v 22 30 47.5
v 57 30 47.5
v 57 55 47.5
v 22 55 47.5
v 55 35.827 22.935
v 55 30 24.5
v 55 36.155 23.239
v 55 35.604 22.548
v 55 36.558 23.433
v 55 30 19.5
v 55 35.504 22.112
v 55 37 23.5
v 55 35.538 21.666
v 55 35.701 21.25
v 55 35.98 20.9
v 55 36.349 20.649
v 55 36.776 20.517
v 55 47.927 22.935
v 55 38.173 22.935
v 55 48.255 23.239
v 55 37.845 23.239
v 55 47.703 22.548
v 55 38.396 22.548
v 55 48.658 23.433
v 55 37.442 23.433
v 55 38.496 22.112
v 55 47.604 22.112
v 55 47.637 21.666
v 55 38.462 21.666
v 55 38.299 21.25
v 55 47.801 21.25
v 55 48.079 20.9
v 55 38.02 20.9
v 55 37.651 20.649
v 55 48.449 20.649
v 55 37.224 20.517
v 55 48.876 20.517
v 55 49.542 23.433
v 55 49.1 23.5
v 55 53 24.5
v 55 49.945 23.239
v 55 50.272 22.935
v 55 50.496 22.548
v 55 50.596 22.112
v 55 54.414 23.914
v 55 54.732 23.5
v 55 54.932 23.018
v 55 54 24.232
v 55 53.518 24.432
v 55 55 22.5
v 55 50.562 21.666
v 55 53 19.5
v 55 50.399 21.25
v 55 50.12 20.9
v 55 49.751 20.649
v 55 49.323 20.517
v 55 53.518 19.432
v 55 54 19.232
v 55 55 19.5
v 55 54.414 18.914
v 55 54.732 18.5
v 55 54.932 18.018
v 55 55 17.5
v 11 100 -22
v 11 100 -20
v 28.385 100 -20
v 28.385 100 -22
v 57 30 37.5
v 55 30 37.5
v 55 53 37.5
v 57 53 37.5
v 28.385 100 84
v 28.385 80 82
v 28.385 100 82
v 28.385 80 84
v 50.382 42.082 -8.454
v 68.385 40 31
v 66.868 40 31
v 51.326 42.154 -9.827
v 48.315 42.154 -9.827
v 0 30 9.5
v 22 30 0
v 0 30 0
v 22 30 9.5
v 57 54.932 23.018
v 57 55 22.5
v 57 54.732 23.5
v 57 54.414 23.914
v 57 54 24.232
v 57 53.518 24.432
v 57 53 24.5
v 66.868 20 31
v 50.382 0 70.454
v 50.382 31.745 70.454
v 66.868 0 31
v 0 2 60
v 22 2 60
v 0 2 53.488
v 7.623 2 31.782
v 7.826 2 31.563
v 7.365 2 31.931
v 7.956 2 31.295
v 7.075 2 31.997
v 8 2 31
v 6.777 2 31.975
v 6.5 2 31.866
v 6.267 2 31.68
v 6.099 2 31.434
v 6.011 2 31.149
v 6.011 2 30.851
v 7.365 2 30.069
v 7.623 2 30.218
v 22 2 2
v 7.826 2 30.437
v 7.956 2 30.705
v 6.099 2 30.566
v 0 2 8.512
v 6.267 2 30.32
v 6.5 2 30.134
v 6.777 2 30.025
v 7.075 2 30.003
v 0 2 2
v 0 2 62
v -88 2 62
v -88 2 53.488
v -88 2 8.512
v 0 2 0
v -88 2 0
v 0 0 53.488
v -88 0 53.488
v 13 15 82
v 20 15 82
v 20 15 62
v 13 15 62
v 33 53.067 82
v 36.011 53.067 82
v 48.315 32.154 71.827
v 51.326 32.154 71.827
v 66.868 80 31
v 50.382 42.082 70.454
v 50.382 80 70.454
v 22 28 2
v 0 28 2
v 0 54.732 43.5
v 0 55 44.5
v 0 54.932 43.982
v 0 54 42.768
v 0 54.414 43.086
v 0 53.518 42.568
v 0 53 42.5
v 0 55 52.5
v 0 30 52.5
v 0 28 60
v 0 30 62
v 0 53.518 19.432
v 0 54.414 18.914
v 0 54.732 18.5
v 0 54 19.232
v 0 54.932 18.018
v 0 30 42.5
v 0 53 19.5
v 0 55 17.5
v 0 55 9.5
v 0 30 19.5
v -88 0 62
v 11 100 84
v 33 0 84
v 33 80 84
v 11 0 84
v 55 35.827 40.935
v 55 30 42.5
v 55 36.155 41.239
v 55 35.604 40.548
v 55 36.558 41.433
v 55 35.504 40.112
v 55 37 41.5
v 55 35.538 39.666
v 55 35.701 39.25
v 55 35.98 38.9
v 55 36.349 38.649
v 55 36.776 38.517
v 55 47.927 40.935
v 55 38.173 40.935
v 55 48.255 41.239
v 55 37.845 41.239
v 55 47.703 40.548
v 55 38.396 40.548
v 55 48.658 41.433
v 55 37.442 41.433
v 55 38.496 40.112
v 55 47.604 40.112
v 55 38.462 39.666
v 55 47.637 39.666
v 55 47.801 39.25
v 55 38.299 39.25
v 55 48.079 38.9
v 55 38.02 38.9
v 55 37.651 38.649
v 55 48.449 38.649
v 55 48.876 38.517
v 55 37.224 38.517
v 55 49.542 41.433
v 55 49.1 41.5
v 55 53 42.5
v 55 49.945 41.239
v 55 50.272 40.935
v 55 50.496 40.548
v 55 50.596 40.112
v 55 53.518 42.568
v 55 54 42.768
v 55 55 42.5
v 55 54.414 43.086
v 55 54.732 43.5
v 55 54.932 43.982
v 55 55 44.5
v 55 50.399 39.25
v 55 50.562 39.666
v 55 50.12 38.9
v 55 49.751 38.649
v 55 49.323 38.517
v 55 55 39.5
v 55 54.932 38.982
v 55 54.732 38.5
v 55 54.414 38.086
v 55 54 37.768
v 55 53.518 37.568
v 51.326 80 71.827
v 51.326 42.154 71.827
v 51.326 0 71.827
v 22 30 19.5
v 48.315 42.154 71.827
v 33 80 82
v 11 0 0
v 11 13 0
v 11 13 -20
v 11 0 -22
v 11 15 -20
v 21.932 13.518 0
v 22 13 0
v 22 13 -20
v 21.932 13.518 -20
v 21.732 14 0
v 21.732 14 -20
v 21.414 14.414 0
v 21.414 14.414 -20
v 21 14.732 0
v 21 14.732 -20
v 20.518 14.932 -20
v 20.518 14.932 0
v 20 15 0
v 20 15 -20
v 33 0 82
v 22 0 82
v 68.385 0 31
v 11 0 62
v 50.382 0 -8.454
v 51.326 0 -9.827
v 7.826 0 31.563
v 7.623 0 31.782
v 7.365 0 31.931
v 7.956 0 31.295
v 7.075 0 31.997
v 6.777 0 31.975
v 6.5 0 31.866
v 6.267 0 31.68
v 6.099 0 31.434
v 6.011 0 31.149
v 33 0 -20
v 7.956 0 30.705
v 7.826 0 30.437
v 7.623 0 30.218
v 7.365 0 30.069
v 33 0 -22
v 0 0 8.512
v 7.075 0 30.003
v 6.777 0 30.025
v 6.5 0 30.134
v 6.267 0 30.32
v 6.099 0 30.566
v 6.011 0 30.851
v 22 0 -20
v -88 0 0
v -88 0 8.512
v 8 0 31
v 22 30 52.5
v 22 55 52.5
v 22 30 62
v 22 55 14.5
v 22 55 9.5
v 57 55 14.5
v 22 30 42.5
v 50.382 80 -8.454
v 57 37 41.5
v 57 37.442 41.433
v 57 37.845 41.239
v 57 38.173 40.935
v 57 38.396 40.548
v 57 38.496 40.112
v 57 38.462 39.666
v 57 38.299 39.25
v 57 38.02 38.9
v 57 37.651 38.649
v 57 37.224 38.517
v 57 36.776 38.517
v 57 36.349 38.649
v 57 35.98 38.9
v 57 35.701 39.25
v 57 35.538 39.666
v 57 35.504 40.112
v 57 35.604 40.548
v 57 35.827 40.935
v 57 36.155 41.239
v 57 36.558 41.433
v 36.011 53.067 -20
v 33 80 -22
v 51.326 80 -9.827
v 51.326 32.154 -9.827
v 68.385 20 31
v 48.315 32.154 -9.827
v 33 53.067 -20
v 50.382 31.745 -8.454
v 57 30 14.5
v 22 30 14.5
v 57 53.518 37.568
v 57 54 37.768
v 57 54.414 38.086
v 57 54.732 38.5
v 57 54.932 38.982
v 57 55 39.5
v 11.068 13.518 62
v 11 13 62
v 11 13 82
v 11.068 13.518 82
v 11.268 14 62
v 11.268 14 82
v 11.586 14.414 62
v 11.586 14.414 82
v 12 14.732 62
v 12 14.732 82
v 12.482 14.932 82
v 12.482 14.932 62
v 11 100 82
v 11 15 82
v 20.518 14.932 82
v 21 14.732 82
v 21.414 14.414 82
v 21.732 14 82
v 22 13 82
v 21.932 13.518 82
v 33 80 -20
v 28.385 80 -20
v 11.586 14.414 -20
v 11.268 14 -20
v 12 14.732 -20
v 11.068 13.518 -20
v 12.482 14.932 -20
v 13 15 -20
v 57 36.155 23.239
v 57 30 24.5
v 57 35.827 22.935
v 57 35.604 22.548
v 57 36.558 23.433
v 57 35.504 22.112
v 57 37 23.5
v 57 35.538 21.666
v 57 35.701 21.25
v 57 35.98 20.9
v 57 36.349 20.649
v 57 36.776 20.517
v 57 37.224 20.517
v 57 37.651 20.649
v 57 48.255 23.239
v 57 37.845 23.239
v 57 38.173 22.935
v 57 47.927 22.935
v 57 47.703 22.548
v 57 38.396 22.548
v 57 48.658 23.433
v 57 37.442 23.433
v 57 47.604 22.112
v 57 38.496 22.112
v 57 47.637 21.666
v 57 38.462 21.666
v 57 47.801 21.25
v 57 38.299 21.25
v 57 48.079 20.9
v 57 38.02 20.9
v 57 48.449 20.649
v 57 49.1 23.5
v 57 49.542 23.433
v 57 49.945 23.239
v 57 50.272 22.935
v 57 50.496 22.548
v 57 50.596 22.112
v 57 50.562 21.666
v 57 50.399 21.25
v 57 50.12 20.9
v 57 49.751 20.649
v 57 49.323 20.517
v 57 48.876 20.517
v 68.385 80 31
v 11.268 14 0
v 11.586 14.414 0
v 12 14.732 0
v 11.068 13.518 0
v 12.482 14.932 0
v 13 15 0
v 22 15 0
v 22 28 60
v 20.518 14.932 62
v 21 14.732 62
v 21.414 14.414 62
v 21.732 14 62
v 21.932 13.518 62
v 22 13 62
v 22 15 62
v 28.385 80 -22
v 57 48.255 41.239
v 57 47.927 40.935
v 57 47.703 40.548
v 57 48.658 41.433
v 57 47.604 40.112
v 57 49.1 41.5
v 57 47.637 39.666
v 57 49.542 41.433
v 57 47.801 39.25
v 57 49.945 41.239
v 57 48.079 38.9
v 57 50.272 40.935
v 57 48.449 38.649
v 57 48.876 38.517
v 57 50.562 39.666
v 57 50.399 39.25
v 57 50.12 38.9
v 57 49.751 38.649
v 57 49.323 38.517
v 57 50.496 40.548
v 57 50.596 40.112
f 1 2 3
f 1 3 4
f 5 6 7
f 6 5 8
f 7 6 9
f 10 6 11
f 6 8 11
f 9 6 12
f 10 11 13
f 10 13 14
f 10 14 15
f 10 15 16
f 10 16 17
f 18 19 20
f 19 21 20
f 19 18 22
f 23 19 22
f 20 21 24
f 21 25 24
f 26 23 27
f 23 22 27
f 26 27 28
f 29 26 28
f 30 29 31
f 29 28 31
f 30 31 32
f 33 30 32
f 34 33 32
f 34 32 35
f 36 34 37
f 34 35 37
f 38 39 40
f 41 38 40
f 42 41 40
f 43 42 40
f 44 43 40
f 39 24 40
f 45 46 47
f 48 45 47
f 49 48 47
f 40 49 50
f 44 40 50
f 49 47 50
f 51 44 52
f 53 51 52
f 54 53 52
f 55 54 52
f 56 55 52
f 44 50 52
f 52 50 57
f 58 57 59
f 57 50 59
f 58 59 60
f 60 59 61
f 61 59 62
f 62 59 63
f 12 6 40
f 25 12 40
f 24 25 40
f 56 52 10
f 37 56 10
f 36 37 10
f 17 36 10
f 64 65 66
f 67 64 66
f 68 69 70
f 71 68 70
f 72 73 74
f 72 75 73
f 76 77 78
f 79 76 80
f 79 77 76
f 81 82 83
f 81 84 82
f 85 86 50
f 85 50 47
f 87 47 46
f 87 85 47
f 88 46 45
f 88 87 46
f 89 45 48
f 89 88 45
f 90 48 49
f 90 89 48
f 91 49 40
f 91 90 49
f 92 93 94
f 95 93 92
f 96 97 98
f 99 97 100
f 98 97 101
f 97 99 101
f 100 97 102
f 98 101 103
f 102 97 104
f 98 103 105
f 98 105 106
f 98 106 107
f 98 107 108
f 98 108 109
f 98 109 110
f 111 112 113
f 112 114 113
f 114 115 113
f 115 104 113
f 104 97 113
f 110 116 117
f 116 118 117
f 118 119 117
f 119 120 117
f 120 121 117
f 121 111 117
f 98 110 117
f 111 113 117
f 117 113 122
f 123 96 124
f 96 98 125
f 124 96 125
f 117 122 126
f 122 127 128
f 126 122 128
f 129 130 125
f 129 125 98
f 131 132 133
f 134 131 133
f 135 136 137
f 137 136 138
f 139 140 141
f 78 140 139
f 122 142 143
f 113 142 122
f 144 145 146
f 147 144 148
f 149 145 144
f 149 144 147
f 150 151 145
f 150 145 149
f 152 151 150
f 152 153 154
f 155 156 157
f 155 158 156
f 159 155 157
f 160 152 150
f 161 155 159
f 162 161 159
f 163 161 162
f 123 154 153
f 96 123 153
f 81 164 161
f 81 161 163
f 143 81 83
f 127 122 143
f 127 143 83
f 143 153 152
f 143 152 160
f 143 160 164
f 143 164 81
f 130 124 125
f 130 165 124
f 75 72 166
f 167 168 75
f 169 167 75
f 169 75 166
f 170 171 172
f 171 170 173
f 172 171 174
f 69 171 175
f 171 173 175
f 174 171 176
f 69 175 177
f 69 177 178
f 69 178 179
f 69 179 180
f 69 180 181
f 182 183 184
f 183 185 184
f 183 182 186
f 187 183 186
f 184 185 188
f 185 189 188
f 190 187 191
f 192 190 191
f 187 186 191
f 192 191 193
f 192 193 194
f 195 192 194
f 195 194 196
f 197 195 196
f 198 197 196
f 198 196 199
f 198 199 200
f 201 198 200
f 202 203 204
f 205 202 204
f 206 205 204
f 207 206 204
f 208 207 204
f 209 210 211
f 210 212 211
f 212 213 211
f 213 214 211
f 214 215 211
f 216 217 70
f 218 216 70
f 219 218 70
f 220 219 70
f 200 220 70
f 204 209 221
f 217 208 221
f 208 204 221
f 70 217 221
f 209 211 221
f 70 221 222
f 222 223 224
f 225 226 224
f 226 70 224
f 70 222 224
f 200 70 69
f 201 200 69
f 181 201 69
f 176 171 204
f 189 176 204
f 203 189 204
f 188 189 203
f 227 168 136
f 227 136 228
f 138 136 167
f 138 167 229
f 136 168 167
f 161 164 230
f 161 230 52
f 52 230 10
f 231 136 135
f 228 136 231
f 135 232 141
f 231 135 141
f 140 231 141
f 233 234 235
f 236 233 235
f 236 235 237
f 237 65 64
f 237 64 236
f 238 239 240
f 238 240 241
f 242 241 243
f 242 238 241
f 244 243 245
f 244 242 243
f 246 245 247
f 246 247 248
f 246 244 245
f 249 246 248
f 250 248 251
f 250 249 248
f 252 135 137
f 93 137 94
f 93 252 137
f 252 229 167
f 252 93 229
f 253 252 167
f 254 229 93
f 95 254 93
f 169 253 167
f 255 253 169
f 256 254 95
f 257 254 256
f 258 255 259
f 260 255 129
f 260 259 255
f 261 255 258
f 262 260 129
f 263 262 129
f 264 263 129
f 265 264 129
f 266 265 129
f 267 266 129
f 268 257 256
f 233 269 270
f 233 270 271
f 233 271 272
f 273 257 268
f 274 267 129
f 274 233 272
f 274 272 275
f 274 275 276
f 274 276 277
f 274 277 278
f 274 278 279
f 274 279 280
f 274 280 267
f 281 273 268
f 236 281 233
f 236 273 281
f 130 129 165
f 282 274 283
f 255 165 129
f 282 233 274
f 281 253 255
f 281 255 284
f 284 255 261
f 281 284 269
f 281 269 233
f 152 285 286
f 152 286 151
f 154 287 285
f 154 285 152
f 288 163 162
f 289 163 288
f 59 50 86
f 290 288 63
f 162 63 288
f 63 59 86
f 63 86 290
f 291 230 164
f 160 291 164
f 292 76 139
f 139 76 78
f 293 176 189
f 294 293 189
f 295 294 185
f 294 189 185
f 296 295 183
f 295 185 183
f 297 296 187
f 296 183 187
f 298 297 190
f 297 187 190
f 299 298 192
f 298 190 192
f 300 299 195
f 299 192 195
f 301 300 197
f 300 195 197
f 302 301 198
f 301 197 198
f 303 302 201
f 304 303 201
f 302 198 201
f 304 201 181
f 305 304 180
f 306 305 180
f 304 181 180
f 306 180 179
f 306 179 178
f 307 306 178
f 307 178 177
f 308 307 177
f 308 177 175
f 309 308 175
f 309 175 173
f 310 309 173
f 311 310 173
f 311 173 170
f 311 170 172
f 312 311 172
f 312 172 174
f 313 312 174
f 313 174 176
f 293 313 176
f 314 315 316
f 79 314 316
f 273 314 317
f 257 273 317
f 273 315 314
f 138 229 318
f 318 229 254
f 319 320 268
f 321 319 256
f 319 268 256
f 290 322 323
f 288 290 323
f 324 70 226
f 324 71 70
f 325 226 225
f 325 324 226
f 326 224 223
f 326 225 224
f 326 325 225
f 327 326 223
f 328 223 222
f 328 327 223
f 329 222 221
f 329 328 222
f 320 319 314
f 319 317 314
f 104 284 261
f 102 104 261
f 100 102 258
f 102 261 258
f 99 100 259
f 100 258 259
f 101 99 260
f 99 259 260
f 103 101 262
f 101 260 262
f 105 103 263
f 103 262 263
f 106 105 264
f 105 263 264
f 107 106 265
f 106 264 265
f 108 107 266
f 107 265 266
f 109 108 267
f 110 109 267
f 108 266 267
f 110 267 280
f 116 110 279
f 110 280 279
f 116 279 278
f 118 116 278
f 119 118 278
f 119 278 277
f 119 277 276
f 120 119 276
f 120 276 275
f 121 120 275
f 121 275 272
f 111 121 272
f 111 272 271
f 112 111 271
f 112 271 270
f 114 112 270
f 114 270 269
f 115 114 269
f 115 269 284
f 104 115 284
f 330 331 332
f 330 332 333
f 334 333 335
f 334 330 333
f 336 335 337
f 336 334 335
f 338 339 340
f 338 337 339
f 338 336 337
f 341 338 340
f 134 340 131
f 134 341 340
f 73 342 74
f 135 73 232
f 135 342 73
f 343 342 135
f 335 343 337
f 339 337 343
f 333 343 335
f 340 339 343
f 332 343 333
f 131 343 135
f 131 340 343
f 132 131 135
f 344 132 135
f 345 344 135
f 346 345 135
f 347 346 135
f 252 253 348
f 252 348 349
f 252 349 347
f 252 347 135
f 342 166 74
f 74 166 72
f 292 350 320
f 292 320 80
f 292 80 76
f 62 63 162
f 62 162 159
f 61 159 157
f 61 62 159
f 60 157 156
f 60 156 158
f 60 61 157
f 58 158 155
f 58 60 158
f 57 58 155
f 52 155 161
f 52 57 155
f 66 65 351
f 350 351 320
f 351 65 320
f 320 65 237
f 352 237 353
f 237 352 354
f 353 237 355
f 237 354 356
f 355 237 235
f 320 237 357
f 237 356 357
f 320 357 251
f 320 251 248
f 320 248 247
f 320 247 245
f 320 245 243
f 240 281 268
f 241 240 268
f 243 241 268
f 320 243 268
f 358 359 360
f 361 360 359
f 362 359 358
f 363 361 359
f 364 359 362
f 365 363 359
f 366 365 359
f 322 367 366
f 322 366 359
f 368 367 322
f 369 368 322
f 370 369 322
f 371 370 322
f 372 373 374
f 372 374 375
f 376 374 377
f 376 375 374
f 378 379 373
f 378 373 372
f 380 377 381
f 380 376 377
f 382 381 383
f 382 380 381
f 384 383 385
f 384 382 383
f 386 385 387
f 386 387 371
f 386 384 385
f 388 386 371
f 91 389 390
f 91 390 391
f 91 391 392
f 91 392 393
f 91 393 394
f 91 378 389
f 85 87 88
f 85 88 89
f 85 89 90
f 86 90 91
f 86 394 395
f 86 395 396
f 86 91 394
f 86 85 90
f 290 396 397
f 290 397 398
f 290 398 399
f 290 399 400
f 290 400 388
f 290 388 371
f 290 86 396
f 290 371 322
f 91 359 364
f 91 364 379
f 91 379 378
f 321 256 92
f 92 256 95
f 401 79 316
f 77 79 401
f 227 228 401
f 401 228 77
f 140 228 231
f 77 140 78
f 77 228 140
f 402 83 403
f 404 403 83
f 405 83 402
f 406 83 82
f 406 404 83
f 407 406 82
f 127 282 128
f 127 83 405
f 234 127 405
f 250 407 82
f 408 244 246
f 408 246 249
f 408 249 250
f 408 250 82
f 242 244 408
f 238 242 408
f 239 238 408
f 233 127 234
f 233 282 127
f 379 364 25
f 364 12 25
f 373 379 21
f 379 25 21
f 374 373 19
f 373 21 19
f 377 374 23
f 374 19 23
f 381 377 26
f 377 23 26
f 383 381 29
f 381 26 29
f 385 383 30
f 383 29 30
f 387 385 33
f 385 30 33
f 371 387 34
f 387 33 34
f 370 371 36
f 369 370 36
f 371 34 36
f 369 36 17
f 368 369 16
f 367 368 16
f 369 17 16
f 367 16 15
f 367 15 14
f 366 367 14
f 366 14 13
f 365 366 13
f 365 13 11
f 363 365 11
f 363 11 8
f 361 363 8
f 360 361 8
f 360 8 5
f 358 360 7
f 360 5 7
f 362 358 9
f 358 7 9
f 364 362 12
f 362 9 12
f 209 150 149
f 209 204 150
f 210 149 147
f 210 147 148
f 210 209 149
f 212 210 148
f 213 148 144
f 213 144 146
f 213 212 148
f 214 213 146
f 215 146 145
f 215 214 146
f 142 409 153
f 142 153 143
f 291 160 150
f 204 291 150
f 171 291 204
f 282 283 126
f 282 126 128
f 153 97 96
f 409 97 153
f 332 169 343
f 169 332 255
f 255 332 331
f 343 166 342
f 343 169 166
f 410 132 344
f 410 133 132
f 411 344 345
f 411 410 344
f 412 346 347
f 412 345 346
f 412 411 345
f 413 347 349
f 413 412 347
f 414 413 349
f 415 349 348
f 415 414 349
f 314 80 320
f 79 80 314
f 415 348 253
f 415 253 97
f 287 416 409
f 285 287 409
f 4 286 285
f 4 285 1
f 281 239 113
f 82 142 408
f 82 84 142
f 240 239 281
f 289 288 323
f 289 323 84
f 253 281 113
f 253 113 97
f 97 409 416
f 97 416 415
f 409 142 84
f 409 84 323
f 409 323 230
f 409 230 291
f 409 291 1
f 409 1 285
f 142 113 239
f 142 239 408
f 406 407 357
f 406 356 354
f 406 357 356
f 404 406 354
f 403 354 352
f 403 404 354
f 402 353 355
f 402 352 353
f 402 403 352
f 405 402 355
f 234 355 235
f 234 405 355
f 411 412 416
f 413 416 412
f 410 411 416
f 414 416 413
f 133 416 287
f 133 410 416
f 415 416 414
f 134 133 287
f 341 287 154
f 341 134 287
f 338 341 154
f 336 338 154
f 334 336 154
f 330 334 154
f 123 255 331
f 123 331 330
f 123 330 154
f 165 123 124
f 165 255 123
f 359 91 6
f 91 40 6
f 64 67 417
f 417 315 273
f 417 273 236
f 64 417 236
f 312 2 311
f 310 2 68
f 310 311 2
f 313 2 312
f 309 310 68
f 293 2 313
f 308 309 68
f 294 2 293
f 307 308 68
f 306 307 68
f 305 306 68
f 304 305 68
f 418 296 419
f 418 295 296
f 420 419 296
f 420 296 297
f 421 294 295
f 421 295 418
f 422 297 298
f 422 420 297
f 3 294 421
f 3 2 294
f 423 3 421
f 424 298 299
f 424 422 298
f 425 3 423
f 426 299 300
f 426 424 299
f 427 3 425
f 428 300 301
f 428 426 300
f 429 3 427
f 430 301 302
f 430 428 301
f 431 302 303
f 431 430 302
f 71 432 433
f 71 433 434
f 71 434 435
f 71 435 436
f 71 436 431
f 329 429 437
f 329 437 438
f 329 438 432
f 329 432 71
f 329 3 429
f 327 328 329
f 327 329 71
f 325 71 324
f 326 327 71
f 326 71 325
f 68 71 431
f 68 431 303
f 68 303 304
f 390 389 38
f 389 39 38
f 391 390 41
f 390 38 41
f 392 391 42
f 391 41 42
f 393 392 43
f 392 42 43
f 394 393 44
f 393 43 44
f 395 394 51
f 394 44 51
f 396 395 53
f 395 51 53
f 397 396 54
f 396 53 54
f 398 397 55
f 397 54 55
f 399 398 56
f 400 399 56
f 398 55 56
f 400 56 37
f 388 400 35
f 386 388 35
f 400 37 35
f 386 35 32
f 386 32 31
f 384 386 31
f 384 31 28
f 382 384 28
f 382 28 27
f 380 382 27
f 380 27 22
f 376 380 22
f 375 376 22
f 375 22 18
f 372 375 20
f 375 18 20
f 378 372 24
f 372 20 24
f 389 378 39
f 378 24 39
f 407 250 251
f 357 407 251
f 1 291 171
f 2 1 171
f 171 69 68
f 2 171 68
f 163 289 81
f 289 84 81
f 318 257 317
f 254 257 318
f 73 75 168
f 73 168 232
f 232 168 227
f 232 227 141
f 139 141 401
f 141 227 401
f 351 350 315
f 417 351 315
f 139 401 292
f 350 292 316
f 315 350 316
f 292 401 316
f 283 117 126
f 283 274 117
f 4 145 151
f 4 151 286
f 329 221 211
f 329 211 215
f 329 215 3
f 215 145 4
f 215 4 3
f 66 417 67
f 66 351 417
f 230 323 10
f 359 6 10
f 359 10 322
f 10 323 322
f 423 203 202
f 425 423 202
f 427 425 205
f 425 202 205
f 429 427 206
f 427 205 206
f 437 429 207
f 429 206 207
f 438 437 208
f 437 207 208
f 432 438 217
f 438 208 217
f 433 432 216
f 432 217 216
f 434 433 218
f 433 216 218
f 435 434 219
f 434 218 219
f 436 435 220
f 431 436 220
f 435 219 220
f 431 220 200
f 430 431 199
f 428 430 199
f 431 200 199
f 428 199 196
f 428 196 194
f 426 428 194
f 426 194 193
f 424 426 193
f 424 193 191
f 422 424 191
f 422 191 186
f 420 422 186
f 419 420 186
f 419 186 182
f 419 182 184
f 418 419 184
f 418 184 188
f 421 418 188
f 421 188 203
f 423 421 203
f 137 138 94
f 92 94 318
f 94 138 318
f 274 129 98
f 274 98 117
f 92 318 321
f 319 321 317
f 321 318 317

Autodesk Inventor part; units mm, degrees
sketch "Boceto1" plane through (0, 0, 0) normal (0, 1, 0) x (-1, 0, 0)
  line L0 (0, 0) -> (-22, 0)
  line L1 (-22, 0) -> (-22, 62)
  line L2 (-22, 62) -> (0, 62)
  line L3 (0, 62) -> (0, 0)
  dimension "d0" = 62
  dimension "d1" = 22
extrude "Extrusión1" add sketch "Boceto1" along normal blind 30
sketch "Boceto2" plane through (22, 0, 62) normal (1, 0, 0) x (0, 0, -1)
  line L0 (62, 0) -> (0, 0) projected
  line L1 (62, 0) -> (62, 30) projected
  line L2 (0, 30) -> (62, 30) projected
  line L3 (0, 0) -> (0, 30) projected
  line L4 (2, 28) -> (60, 28)
  line L5 (60, 28) -> (60, 2)
  line L6 (60, 2) -> (2, 2)
  line L7 (2, 2) -> (2, 28)
  dimension "d4" = 2
  dimension "d5" = 2
  dimension "d6" = 2
  dimension "d7" = 2
extrude "Extrusión2" cut sketch "Boceto2" against normal blind 30 contours L4 L5 L6 L7
sketch "Boceto3" plane through (0, 0, 0) normal (0, -1, 0) x (1, 0, 0)
  line L0 (0, 0) -> (22, 0) projected
  line L1 (22, 62) -> (0, 62) projected
  line L2 (22, 62) -> (7, 62)
  line L3 (7, 62) -> (7, 31)
  circle A0 centre (7, 31) radius 1
  dimension "d10" = 15
  dimension "d11" = 31
  dimension "d12" = 2
extrude "Extrusión3" cut sketch "Boceto3" against normal blind 15
sketch "Boceto4" plane through (0, 0, 62) normal (0, 0, 1) x (1, 0, 0)
  line L0 (22, 0) -> (0, 0) projected
  line L1 (22, 0) -> (22, 30) projected
  line L2 (0, 30) -> (22, 30) projected
  line L3 (0, 0) -> (0, 30) projected
sketch "Boceto5" plane through (0, 0, 62) normal (0, 0, 1) x (1, 0, 0)
  line L0 (22, 0) -> (0, 0) projected
  line L1 (22, 0) -> (22, 30) projected
  line L2 (0, 30) -> (22, 30) projected
  line L3 (0, 0) -> (0, 30) projected
sketch "Boceto7" plane through (0, 0, 62) normal (0, 0, 1) x (1, 0, 0)
  line L0 (22, 0) -> (0, 0) projected
  line L1 (22, 0) -> (22, 30) projected
  line L2 (0, 30) -> (22, 30) projected
  line L3 (0, 0) -> (0, 30) projected
  line L4 (0, 30) -> (22, 30)
  line L5 (22, 30) -> (22, 0)
  line L6 (22, 0) -> (0, 0)
  line L7 (0, 0) -> (0, 30)
  line L8 (22, 0) -> (11, 0)
  line L9 (11, 0) -> (11, 15)
  line L10 (11, 15) -> (22, 15)
  line L11 (22, 15) -> (22, 0)
  dimension "d17" = 15
  dimension "d18" = 11
sketch "Boceto9" plane through (0, 0, 62) normal (0, 0, 1) x (1, 0, 0)
  line L0 (22, 0) -> (0, 0) projected
  line L1 (22, 0) -> (22, 30) projected
  line L2 (0, 30) -> (22, 30) projected
  line L3 (0, 0) -> (0, 30) projected
sketch "Boceto10" plane through (22, 0, 62) normal (1, 0, 0) x (0, 0, -1)
  line L0 (62, 0) -> (0, 0) projected
  line L1 (0, 30) -> (62, 30) projected
  line L2 (0, 30) -> (31, 30) construction
  line L3 (31, 30) -> (31, 0) construction
  line L4 (0, 0) -> (-20, 0)
  line L5 (-20, 0) -> (-20, 15)
  line L6 (-20, 15) -> (0, 15)
  line L7 (0, 15) -> (0, 0)
  line L8 (62, 0) -> (62, 30)
  line L9 (62, 0) -> (82, 0)
  line L10 (82, 0) -> (82, 15)
  line L11 (82, 15) -> (62, 15)
  line L12 (0, 30) -> (62, 30)
  line L13 (62, 30) -> (62, 0)
  line L14 (62, 0) -> (0, 0)
  line L15 (0, 0) -> (0, 30)
  line L16 (2, 28) -> (60, 28)
  line L17 (60, 28) -> (60, 2)
  line L18 (60, 2) -> (2, 2)
  line L19 (2, 2) -> (2, 28)
  dimension "d20" = 31
  dimension "d21" = 20
  dimension "d22" = 15
extrude "Extrusión4" add sketch "Boceto10" against normal blind 11 contours L4 L5 L6 L7
ref_plane "Plano de trabajo3" through (0, 30, 31) normal (0, 0, 1) x (1, 0, 0)
mirror "Simetría1" about plane through (0, 30, 31) normal (0, 0, 1) of "Extrusión4"
sketch "Boceto11" plane through (0, 0, 0) normal (0, -1, 0) x (1, 0, 0)
  line L0 (11, 0) -> (11, -20) projected
  line L1 (0, 62) -> (0, 0) projected
  line L2 (11, 82) -> (33, 82)
  line L3 (33, 82) -> (33, 84)
  line L4 (33, 84) -> (11, 84)
  line L5 (11, 84) -> (11, 82)
  line L6 (0, 31) -> (103.8517, 31) construction
  line L7 (11, 62) -> (11, 0) construction
  circle A0 centre (11, 31) radius 57.3847 construction
  line L8 (33, 84) -> (51.3255, 71.8272)
  line L9 (51.3255, 71.8272) -> (68.3847, 31)
  line L10 (33, 82) -> (50.3824, 70.4536)
  line L11 (50.3824, 70.4536) -> (66.8677, 31)
  line L12 (68.3847, 31) -> (66.8677, 31)
  line L13 (11, -20) -> (33, -20)
  line L14 (33, -20) -> (33, -22)
  line L15 (33, -22) -> (11, -22)
  line L16 (11, -22) -> (11, -20)
  line L17 (33, -22) -> (51.3255, -9.8272)
  line L18 (51.3255, -9.8272) -> (68.3847, 31)
  line L19 (33, -20) -> (50.3824, -8.4536)
  line L20 (50.3824, -8.4536) -> (66.8677, 31)
  dimension "d25" = 22
  dimension "d26" = 2
  dimension "d27" = 22
  dimension "d28" = 39.4536
extrude "Extrusión5" add sketch "Boceto11" against normal blind 100
ref_plane "Plano de trabajo4" through (68.3847, 0, 31) normal (1, 0, 0) x (0, 1, 0)
sketch "Boceto12" plane through (68.3847, 0, 31) normal (1, 0, 0) x (0, 1, 0)
  point P0 (0, -31)
sketch "Boceto13" plane through (68.3847, 0, 31) normal (1, 0, 0) x (0, 1, 0)
  line L0 (0, 40.8272) -> (0, 53) projected
  line L1 (0, 40.8272) -> (100, 40.8272) projected
  line L2 (100, 53) -> (100, 40.8272) projected
  line L3 (0, 53) -> (100, 53) projected
  line L4 (0, 0) -> (0, 40.8272) projected
  line L5 (0, 0) -> (100, 0) projected
  line L6 (100, 40.8272) -> (100, 0) projected
  line L7 (0, 40.8272) -> (100, 40.8272) projected
  line L8 (0, -40.8272) -> (0, 0) projected
  line L9 (0, -40.8272) -> (100, -40.8272) projected
  line L10 (100, 0) -> (100, -40.8272) projected
  line L11 (0, 0) -> (100, 0) projected
  line L12 (0, -53) -> (0, -40.8272) projected
  line L13 (0, -53) -> (100, -53) projected
  line L14 (100, -40.8272) -> (100, -53) projected
  line L15 (0, -40.8272) -> (100, -40.8272) projected
  line L16 (0, 0) -> (20, 0) construction
  line L17 (0, -51) -> (100, -51) projected
  line L18 (20, 0) -> (32.1544, -40.8272)
  line L19 (32.1544, -40.8272) -> (53.0672, -51)
  line L20 (32.1544, -40.8272) -> (42.1544, -40.8272) construction
  line L21 (20, 0) -> (40, 0) construction
  line L22 (40, 0) -> (42.1544, -40.8272)
  line L23 (42.1544, -40.8272) -> (53.0672, -51)
  line L24 (40, 0) -> (20, 0)
  line L25 (20, 0) -> (0, 0)
  line L26 (42.1544, -40.8272) -> (32.1544, -40.8272)
  line L27 (0, 51) -> (100, 51) projected
  line L28 (20, 0) -> (32.1544, 40.8272)
  line L29 (32.1544, 40.8272) -> (53.0672, 51)
  line L30 (40, 0) -> (42.1544, 40.8272)
  line L31 (42.1544, 40.8272) -> (53.0672, 51)
  point P0 (0, -31)
  dimension "d32" = 20
  dimension "d33" = 10
  dimension "d34" = 20
  dimension "d35" = 20.9128
extrude "Extrusión6" cut sketch "Boceto13" against normal blind 40 contours L5 L22 L9 L18 | L9 L23 L19
ref_plane "Plano de trabajo5" through (11, 0, 31) normal (0, 0, 1) x (1, 0, 0)
mirror "Simetría2" about plane through (11, 0, 31) normal (0, 0, 1) of "Extrusión6"
sketch "Boceto14" plane through (68.3847, 0, 31) normal (1, 0, 0) x (0, 1, 0)
  line L0 (32.1544, 40.8272) -> (53.0672, 51) projected
  line L1 (53.0672, 51) -> (42.1544, 40.8272) projected
  line L2 (42.1544, 40.8272) -> (100, 40.8272) projected
  line L3 (100, 53) -> (100, 40.8272) projected
  line L4 (0, 53) -> (100, 53) projected
  line L5 (0, 40.8272) -> (0, 53) projected
  line L6 (0, 40.8272) -> (32.1544, 40.8272) projected
  line L7 (42.1544, 40.8272) -> (40, 0) projected
  line L8 (40, 0) -> (100, 0) projected
  line L9 (100, 40.8272) -> (100, 0) projected
  line L10 (42.1544, 40.8272) -> (100, 40.8272) projected
  line L11 (40, 0) -> (42.1544, -40.8272) projected
  line L12 (42.1544, -40.8272) -> (100, -40.8272) projected
  line L13 (100, 0) -> (100, -40.8272) projected
  line L14 (40, 0) -> (100, 0) projected
  line L15 (53.0672, -51) -> (32.1544, -40.8272) projected
  line L16 (0, -40.8272) -> (32.1544, -40.8272) projected
  line L17 (0, -53) -> (0, -40.8272) projected
  line L18 (0, -53) -> (100, -53) projected
  line L19 (100, -40.8272) -> (100, -53) projected
  line L20 (42.1544, -40.8272) -> (100, -40.8272) projected
  line L21 (42.1544, -40.8272) -> (53.0672, -51) projected
  line L22 (32.1544, -40.8272) -> (20, 0) projected
  line L23 (0, 0) -> (20, 0) projected
  line L24 (0, -40.8272) -> (0, 0) projected
  line L25 (0, -40.8272) -> (32.1544, -40.8272) projected
  line L26 (20, 0) -> (32.1544, 40.8272) projected
  line L27 (0, 40.8272) -> (32.1544, 40.8272) projected
  line L28 (0, 0) -> (0, 40.8272) projected
  line L29 (0, 0) -> (20, 0) projected
  line L30 (100, 53) -> (80, 53)
  line L31 (80, 53) -> (80, -53)
  line L32 (100, -53) -> (100, 53)
  line L33 (80, -53) -> (100, -53)
  point P0 (0, -31)
  dimension "d38" = 20
extrude "Extrusión7" cut sketch "Boceto14" against normal blind 40 contours L31 L4 L3 L2 | L2 L9 L8 L31 | L8 L13 L12 L31 | L12 L19 L18 L31
sketch "Boceto15" plane through (0, 30, 0) normal (0, 1, 0) x (1, 0, 0)
  line L0 (0, 0) -> (0, -62) projected
  line L1 (22, -62) -> (22, 0) projected
  line L2 (0, -31) -> (22, -31) construction
  line L3 (22, -31) -> (22, -19.5) construction
  line L4 (22, -31) -> (22, -42.5) construction
  line L5 (0, -19.5) -> (55, -19.5)
  line L6 (55, -19.5) -> (55, -14.5)
  line L7 (55, -14.5) -> (22, -14.5)
  line L8 (22, -14.5) -> (22, -9.5)
  line L9 (22, -9.5) -> (0, -9.5)
  line L10 (0, -19.5) -> (0, -9.5)
  line L11 (0, -9.5) -> (0, -19.5)
  line L12 (0, -42.5) -> (55, -42.5)
  line L13 (55, -42.5) -> (55, -47.5)
  line L14 (55, -47.5) -> (22, -47.5)
  line L15 (22, -47.5) -> (22, -52.5)
  line L16 (22, -52.5) -> (0, -52.5)
  line L17 (0, -52.5) -> (0, -42.5)
  dimension "d41" = 11.5
  dimension "d42" = 11.5
  dimension "d43" = 55
  dimension "d44" = 5
  dimension "d45" = 5
extrude "Extrusión8" add sketch "Boceto15" along normal blind 25 contours L9 L1 L5 L0 | L12 L1 L16 L0 | L1 L7 L6 L5 | L12 L13 L14 L1
ref_plane "Plano de trabajo6" through (55, 42.5, 47.5) normal (1, 0, 0) x (0, 0, -1)
sketch "Boceto16" plane through (55, 42.5, 47.5) normal (1, 0, 0) x (0, 0, -1)
  line L0 (28, -12.5) -> (33, -12.5) projected
  line L1 (33, -12.5) -> (33, 12.5) projected
  line L2 (28, 12.5) -> (33, 12.5) projected
  line L3 (28, -12.5) -> (28, 12.5) projected
  line L4 (0, -12.5) -> (5, -12.5) projected
  line L5 (5, -12.5) -> (5, 12.5) projected
  line L6 (0, 12.5) -> (5, 12.5) projected
  line L7 (0, -12.5) -> (0, 12.5) projected
  line L8 (0, -12.5) -> (10, -12.5)
  line L9 (10, -12.5) -> (10, 12.5)
  line L10 (10, 12.5) -> (0, 12.5)
  line L11 (0, 12.5) -> (0, -12.5)
  line L12 (5, 0) -> (16.5, 0) construction
  line L13 (-12.5, -40.5) -> (-12.5, -14.5) construction
  line L14 (-12.5, -14.5) -> (45.5, -14.5) construction
  line L15 (45.5, -14.5) -> (45.5, -40.5) construction
  line L16 (45.5, -40.5) -> (-12.5, -40.5) construction
  line L17 (67.5, -42.5) -> (-34.5, -42.5) construction
  line L18 (67.5, -27.5) -> (67.5, -42.5) construction
  line L19 (47.5, -27.5) -> (67.5, -27.5) construction
  line L20 (47.5, -27.5) -> (47.5, -12.5) construction
  line L21 (38, -12.5) -> (47.5, -12.5) construction
  line L22 (38, -12.5) -> (38, 12.5) construction
  line L23 (33, 12.5) -> (38, 12.5) construction
  line L24 (33, -12.5) -> (33, 12.5) construction
  line L25 (28, -12.5) -> (33, -12.5) construction
  line L26 (5, -12.5) -> (28, -12.5) construction
  line L27 (0, -12.5) -> (5, -12.5) construction
  line L28 (0, -12.5) -> (0, 12.5) construction
  line L29 (-5, 12.5) -> (0, 12.5) construction
  line L30 (-5, -12.5) -> (-5, 12.5) construction
  line L31 (-14.5, -12.5) -> (-5, -12.5) construction
  line L32 (-14.5, -27.5) -> (-14.5, -12.5) construction
  line L33 (-14.5, -27.5) -> (-34.5, -27.5) construction
  line L34 (-34.5, -27.5) -> (-34.5, -42.5) construction
  line L35 (16.5, -12.5) -> (16.5, -3.1507) construction
  line L36 (33, -12.5) -> (28, -12.5)
  line L37 (33, 12.5) -> (28, 12.5)
  line L38 (33, -12.5) -> (33, 12.5)
  line L39 (33, -12.5) -> (23, -12.5)
  line L40 (23, -12.5) -> (23, 12.5)
  line L41 (23, 12.5) -> (33, 12.5)
  point P0 (47.5, -42.5)
  dimension "d49" = 25
  dimension "d50" = 11.5
  dimension "d51" = 11.5
extrude "Extrusión9" add sketch "Boceto16" along normal blind 2 contours L7 L6 L5 L4 | L5 L10 L9 L8
ref_plane "Plano de trabajo7" through (33, 0, 31) normal (0, 0, -1) x (-1, 0, 0)
mirror "Simetría3" about plane through (33, 0, 31) normal (0, 0, -1) of "Extrusión9"
ref_plane "Plano de trabajo8" through (55, 42.5, 24.5) normal (-1, 0, 0) x (0, 0, 1)
sketch "Boceto17" plane through (55, 42.5, 24.5) normal (-1, 0, 0) x (0, 0, 1)
  line L0 (-5, -12.5) -> (-5, 12.5) projected
  line L1 (-5, -12.5) -> (0, -12.5) projected
  line L2 (0, -12.5) -> (0, 12.5) projected
  line L3 (0, 12.5) -> (-5, 12.5) projected
  line L4 (18, -12.5) -> (18, 12.5) projected
  line L5 (13, 12.5) -> (18, 12.5) projected
  line L6 (13, -12.5) -> (13, 12.5) projected
  line L7 (18, -12.5) -> (13, -12.5) projected
  line L8 (18, -12.5) -> (18, -5.5) construction
  line L9 (18, -5.5) -> (15.5, -5.5) construction
  circle A0 centre (15.5, -5.5) radius 1.5 construction
  circle A1 centre (15.5, -5.5) radius 1.5
  circle A2 centre (15.5, 6.5997) radius 1.5
  circle A3 centre (-2.5, 6.5997) radius 1.5
  circle A4 centre (-2.5, -5.5) radius 1.5
  point P0 (-24.5, -42.5)
  dimension "d54" = 7
  dimension "d55" = 2.5
  dimension "d56" = 3
  dimension "d57" = 3
  dimension "d58" = 3
  dimension "d59" = 3
  dimension "d60" = 3
extrude "Extrusión10" cut sketch "Boceto17" against normal blind 5 contours A1 | A2 | A3 | A4
sketch "Boceto18" plane through (0, 0, 0) normal (0, -1, 0) x (1, 0, 0)
  line L0 (0, 62) -> (-88, 62)
  line L1 (-88, 62) -> (-88, 53.488)
  line L2 (-88, 53.488) -> (0, 53.488)
  line L3 (0, 53.488) -> (0, 62)
  dimension "d63" = 88
extrude "Extrusión11" add sketch "Boceto18" against normal blind 2
mirror "Simetría4" about plane through (33, 0, 31) normal (0, 0, -1) of "Extrusión11"
fillet "Empalme1" radius 2 1 edges at (27.5, 55, 19.5)
fillet "Empalme2" radius 2 1 edges at (27.5, 55, 42.5)
fillet "Empalme3" radius 2 1 edges at (56, 55, 37.5)
fillet "Empalme4" radius 2 1 edges at (56, 55, 24.5)
fillet "Empalme5" radius 2 1 edges at (11, 15, 72)
fillet "Empalme6" radius 2 1 edges at (11, 15, -10)
fillet "Empalme7" radius 2 1 edges at (22, 15, 72)
fillet "Empalme8" radius 2 1 edges at (22, 15, -10)
properties part number "Face" material "Madera (cerezo)"
